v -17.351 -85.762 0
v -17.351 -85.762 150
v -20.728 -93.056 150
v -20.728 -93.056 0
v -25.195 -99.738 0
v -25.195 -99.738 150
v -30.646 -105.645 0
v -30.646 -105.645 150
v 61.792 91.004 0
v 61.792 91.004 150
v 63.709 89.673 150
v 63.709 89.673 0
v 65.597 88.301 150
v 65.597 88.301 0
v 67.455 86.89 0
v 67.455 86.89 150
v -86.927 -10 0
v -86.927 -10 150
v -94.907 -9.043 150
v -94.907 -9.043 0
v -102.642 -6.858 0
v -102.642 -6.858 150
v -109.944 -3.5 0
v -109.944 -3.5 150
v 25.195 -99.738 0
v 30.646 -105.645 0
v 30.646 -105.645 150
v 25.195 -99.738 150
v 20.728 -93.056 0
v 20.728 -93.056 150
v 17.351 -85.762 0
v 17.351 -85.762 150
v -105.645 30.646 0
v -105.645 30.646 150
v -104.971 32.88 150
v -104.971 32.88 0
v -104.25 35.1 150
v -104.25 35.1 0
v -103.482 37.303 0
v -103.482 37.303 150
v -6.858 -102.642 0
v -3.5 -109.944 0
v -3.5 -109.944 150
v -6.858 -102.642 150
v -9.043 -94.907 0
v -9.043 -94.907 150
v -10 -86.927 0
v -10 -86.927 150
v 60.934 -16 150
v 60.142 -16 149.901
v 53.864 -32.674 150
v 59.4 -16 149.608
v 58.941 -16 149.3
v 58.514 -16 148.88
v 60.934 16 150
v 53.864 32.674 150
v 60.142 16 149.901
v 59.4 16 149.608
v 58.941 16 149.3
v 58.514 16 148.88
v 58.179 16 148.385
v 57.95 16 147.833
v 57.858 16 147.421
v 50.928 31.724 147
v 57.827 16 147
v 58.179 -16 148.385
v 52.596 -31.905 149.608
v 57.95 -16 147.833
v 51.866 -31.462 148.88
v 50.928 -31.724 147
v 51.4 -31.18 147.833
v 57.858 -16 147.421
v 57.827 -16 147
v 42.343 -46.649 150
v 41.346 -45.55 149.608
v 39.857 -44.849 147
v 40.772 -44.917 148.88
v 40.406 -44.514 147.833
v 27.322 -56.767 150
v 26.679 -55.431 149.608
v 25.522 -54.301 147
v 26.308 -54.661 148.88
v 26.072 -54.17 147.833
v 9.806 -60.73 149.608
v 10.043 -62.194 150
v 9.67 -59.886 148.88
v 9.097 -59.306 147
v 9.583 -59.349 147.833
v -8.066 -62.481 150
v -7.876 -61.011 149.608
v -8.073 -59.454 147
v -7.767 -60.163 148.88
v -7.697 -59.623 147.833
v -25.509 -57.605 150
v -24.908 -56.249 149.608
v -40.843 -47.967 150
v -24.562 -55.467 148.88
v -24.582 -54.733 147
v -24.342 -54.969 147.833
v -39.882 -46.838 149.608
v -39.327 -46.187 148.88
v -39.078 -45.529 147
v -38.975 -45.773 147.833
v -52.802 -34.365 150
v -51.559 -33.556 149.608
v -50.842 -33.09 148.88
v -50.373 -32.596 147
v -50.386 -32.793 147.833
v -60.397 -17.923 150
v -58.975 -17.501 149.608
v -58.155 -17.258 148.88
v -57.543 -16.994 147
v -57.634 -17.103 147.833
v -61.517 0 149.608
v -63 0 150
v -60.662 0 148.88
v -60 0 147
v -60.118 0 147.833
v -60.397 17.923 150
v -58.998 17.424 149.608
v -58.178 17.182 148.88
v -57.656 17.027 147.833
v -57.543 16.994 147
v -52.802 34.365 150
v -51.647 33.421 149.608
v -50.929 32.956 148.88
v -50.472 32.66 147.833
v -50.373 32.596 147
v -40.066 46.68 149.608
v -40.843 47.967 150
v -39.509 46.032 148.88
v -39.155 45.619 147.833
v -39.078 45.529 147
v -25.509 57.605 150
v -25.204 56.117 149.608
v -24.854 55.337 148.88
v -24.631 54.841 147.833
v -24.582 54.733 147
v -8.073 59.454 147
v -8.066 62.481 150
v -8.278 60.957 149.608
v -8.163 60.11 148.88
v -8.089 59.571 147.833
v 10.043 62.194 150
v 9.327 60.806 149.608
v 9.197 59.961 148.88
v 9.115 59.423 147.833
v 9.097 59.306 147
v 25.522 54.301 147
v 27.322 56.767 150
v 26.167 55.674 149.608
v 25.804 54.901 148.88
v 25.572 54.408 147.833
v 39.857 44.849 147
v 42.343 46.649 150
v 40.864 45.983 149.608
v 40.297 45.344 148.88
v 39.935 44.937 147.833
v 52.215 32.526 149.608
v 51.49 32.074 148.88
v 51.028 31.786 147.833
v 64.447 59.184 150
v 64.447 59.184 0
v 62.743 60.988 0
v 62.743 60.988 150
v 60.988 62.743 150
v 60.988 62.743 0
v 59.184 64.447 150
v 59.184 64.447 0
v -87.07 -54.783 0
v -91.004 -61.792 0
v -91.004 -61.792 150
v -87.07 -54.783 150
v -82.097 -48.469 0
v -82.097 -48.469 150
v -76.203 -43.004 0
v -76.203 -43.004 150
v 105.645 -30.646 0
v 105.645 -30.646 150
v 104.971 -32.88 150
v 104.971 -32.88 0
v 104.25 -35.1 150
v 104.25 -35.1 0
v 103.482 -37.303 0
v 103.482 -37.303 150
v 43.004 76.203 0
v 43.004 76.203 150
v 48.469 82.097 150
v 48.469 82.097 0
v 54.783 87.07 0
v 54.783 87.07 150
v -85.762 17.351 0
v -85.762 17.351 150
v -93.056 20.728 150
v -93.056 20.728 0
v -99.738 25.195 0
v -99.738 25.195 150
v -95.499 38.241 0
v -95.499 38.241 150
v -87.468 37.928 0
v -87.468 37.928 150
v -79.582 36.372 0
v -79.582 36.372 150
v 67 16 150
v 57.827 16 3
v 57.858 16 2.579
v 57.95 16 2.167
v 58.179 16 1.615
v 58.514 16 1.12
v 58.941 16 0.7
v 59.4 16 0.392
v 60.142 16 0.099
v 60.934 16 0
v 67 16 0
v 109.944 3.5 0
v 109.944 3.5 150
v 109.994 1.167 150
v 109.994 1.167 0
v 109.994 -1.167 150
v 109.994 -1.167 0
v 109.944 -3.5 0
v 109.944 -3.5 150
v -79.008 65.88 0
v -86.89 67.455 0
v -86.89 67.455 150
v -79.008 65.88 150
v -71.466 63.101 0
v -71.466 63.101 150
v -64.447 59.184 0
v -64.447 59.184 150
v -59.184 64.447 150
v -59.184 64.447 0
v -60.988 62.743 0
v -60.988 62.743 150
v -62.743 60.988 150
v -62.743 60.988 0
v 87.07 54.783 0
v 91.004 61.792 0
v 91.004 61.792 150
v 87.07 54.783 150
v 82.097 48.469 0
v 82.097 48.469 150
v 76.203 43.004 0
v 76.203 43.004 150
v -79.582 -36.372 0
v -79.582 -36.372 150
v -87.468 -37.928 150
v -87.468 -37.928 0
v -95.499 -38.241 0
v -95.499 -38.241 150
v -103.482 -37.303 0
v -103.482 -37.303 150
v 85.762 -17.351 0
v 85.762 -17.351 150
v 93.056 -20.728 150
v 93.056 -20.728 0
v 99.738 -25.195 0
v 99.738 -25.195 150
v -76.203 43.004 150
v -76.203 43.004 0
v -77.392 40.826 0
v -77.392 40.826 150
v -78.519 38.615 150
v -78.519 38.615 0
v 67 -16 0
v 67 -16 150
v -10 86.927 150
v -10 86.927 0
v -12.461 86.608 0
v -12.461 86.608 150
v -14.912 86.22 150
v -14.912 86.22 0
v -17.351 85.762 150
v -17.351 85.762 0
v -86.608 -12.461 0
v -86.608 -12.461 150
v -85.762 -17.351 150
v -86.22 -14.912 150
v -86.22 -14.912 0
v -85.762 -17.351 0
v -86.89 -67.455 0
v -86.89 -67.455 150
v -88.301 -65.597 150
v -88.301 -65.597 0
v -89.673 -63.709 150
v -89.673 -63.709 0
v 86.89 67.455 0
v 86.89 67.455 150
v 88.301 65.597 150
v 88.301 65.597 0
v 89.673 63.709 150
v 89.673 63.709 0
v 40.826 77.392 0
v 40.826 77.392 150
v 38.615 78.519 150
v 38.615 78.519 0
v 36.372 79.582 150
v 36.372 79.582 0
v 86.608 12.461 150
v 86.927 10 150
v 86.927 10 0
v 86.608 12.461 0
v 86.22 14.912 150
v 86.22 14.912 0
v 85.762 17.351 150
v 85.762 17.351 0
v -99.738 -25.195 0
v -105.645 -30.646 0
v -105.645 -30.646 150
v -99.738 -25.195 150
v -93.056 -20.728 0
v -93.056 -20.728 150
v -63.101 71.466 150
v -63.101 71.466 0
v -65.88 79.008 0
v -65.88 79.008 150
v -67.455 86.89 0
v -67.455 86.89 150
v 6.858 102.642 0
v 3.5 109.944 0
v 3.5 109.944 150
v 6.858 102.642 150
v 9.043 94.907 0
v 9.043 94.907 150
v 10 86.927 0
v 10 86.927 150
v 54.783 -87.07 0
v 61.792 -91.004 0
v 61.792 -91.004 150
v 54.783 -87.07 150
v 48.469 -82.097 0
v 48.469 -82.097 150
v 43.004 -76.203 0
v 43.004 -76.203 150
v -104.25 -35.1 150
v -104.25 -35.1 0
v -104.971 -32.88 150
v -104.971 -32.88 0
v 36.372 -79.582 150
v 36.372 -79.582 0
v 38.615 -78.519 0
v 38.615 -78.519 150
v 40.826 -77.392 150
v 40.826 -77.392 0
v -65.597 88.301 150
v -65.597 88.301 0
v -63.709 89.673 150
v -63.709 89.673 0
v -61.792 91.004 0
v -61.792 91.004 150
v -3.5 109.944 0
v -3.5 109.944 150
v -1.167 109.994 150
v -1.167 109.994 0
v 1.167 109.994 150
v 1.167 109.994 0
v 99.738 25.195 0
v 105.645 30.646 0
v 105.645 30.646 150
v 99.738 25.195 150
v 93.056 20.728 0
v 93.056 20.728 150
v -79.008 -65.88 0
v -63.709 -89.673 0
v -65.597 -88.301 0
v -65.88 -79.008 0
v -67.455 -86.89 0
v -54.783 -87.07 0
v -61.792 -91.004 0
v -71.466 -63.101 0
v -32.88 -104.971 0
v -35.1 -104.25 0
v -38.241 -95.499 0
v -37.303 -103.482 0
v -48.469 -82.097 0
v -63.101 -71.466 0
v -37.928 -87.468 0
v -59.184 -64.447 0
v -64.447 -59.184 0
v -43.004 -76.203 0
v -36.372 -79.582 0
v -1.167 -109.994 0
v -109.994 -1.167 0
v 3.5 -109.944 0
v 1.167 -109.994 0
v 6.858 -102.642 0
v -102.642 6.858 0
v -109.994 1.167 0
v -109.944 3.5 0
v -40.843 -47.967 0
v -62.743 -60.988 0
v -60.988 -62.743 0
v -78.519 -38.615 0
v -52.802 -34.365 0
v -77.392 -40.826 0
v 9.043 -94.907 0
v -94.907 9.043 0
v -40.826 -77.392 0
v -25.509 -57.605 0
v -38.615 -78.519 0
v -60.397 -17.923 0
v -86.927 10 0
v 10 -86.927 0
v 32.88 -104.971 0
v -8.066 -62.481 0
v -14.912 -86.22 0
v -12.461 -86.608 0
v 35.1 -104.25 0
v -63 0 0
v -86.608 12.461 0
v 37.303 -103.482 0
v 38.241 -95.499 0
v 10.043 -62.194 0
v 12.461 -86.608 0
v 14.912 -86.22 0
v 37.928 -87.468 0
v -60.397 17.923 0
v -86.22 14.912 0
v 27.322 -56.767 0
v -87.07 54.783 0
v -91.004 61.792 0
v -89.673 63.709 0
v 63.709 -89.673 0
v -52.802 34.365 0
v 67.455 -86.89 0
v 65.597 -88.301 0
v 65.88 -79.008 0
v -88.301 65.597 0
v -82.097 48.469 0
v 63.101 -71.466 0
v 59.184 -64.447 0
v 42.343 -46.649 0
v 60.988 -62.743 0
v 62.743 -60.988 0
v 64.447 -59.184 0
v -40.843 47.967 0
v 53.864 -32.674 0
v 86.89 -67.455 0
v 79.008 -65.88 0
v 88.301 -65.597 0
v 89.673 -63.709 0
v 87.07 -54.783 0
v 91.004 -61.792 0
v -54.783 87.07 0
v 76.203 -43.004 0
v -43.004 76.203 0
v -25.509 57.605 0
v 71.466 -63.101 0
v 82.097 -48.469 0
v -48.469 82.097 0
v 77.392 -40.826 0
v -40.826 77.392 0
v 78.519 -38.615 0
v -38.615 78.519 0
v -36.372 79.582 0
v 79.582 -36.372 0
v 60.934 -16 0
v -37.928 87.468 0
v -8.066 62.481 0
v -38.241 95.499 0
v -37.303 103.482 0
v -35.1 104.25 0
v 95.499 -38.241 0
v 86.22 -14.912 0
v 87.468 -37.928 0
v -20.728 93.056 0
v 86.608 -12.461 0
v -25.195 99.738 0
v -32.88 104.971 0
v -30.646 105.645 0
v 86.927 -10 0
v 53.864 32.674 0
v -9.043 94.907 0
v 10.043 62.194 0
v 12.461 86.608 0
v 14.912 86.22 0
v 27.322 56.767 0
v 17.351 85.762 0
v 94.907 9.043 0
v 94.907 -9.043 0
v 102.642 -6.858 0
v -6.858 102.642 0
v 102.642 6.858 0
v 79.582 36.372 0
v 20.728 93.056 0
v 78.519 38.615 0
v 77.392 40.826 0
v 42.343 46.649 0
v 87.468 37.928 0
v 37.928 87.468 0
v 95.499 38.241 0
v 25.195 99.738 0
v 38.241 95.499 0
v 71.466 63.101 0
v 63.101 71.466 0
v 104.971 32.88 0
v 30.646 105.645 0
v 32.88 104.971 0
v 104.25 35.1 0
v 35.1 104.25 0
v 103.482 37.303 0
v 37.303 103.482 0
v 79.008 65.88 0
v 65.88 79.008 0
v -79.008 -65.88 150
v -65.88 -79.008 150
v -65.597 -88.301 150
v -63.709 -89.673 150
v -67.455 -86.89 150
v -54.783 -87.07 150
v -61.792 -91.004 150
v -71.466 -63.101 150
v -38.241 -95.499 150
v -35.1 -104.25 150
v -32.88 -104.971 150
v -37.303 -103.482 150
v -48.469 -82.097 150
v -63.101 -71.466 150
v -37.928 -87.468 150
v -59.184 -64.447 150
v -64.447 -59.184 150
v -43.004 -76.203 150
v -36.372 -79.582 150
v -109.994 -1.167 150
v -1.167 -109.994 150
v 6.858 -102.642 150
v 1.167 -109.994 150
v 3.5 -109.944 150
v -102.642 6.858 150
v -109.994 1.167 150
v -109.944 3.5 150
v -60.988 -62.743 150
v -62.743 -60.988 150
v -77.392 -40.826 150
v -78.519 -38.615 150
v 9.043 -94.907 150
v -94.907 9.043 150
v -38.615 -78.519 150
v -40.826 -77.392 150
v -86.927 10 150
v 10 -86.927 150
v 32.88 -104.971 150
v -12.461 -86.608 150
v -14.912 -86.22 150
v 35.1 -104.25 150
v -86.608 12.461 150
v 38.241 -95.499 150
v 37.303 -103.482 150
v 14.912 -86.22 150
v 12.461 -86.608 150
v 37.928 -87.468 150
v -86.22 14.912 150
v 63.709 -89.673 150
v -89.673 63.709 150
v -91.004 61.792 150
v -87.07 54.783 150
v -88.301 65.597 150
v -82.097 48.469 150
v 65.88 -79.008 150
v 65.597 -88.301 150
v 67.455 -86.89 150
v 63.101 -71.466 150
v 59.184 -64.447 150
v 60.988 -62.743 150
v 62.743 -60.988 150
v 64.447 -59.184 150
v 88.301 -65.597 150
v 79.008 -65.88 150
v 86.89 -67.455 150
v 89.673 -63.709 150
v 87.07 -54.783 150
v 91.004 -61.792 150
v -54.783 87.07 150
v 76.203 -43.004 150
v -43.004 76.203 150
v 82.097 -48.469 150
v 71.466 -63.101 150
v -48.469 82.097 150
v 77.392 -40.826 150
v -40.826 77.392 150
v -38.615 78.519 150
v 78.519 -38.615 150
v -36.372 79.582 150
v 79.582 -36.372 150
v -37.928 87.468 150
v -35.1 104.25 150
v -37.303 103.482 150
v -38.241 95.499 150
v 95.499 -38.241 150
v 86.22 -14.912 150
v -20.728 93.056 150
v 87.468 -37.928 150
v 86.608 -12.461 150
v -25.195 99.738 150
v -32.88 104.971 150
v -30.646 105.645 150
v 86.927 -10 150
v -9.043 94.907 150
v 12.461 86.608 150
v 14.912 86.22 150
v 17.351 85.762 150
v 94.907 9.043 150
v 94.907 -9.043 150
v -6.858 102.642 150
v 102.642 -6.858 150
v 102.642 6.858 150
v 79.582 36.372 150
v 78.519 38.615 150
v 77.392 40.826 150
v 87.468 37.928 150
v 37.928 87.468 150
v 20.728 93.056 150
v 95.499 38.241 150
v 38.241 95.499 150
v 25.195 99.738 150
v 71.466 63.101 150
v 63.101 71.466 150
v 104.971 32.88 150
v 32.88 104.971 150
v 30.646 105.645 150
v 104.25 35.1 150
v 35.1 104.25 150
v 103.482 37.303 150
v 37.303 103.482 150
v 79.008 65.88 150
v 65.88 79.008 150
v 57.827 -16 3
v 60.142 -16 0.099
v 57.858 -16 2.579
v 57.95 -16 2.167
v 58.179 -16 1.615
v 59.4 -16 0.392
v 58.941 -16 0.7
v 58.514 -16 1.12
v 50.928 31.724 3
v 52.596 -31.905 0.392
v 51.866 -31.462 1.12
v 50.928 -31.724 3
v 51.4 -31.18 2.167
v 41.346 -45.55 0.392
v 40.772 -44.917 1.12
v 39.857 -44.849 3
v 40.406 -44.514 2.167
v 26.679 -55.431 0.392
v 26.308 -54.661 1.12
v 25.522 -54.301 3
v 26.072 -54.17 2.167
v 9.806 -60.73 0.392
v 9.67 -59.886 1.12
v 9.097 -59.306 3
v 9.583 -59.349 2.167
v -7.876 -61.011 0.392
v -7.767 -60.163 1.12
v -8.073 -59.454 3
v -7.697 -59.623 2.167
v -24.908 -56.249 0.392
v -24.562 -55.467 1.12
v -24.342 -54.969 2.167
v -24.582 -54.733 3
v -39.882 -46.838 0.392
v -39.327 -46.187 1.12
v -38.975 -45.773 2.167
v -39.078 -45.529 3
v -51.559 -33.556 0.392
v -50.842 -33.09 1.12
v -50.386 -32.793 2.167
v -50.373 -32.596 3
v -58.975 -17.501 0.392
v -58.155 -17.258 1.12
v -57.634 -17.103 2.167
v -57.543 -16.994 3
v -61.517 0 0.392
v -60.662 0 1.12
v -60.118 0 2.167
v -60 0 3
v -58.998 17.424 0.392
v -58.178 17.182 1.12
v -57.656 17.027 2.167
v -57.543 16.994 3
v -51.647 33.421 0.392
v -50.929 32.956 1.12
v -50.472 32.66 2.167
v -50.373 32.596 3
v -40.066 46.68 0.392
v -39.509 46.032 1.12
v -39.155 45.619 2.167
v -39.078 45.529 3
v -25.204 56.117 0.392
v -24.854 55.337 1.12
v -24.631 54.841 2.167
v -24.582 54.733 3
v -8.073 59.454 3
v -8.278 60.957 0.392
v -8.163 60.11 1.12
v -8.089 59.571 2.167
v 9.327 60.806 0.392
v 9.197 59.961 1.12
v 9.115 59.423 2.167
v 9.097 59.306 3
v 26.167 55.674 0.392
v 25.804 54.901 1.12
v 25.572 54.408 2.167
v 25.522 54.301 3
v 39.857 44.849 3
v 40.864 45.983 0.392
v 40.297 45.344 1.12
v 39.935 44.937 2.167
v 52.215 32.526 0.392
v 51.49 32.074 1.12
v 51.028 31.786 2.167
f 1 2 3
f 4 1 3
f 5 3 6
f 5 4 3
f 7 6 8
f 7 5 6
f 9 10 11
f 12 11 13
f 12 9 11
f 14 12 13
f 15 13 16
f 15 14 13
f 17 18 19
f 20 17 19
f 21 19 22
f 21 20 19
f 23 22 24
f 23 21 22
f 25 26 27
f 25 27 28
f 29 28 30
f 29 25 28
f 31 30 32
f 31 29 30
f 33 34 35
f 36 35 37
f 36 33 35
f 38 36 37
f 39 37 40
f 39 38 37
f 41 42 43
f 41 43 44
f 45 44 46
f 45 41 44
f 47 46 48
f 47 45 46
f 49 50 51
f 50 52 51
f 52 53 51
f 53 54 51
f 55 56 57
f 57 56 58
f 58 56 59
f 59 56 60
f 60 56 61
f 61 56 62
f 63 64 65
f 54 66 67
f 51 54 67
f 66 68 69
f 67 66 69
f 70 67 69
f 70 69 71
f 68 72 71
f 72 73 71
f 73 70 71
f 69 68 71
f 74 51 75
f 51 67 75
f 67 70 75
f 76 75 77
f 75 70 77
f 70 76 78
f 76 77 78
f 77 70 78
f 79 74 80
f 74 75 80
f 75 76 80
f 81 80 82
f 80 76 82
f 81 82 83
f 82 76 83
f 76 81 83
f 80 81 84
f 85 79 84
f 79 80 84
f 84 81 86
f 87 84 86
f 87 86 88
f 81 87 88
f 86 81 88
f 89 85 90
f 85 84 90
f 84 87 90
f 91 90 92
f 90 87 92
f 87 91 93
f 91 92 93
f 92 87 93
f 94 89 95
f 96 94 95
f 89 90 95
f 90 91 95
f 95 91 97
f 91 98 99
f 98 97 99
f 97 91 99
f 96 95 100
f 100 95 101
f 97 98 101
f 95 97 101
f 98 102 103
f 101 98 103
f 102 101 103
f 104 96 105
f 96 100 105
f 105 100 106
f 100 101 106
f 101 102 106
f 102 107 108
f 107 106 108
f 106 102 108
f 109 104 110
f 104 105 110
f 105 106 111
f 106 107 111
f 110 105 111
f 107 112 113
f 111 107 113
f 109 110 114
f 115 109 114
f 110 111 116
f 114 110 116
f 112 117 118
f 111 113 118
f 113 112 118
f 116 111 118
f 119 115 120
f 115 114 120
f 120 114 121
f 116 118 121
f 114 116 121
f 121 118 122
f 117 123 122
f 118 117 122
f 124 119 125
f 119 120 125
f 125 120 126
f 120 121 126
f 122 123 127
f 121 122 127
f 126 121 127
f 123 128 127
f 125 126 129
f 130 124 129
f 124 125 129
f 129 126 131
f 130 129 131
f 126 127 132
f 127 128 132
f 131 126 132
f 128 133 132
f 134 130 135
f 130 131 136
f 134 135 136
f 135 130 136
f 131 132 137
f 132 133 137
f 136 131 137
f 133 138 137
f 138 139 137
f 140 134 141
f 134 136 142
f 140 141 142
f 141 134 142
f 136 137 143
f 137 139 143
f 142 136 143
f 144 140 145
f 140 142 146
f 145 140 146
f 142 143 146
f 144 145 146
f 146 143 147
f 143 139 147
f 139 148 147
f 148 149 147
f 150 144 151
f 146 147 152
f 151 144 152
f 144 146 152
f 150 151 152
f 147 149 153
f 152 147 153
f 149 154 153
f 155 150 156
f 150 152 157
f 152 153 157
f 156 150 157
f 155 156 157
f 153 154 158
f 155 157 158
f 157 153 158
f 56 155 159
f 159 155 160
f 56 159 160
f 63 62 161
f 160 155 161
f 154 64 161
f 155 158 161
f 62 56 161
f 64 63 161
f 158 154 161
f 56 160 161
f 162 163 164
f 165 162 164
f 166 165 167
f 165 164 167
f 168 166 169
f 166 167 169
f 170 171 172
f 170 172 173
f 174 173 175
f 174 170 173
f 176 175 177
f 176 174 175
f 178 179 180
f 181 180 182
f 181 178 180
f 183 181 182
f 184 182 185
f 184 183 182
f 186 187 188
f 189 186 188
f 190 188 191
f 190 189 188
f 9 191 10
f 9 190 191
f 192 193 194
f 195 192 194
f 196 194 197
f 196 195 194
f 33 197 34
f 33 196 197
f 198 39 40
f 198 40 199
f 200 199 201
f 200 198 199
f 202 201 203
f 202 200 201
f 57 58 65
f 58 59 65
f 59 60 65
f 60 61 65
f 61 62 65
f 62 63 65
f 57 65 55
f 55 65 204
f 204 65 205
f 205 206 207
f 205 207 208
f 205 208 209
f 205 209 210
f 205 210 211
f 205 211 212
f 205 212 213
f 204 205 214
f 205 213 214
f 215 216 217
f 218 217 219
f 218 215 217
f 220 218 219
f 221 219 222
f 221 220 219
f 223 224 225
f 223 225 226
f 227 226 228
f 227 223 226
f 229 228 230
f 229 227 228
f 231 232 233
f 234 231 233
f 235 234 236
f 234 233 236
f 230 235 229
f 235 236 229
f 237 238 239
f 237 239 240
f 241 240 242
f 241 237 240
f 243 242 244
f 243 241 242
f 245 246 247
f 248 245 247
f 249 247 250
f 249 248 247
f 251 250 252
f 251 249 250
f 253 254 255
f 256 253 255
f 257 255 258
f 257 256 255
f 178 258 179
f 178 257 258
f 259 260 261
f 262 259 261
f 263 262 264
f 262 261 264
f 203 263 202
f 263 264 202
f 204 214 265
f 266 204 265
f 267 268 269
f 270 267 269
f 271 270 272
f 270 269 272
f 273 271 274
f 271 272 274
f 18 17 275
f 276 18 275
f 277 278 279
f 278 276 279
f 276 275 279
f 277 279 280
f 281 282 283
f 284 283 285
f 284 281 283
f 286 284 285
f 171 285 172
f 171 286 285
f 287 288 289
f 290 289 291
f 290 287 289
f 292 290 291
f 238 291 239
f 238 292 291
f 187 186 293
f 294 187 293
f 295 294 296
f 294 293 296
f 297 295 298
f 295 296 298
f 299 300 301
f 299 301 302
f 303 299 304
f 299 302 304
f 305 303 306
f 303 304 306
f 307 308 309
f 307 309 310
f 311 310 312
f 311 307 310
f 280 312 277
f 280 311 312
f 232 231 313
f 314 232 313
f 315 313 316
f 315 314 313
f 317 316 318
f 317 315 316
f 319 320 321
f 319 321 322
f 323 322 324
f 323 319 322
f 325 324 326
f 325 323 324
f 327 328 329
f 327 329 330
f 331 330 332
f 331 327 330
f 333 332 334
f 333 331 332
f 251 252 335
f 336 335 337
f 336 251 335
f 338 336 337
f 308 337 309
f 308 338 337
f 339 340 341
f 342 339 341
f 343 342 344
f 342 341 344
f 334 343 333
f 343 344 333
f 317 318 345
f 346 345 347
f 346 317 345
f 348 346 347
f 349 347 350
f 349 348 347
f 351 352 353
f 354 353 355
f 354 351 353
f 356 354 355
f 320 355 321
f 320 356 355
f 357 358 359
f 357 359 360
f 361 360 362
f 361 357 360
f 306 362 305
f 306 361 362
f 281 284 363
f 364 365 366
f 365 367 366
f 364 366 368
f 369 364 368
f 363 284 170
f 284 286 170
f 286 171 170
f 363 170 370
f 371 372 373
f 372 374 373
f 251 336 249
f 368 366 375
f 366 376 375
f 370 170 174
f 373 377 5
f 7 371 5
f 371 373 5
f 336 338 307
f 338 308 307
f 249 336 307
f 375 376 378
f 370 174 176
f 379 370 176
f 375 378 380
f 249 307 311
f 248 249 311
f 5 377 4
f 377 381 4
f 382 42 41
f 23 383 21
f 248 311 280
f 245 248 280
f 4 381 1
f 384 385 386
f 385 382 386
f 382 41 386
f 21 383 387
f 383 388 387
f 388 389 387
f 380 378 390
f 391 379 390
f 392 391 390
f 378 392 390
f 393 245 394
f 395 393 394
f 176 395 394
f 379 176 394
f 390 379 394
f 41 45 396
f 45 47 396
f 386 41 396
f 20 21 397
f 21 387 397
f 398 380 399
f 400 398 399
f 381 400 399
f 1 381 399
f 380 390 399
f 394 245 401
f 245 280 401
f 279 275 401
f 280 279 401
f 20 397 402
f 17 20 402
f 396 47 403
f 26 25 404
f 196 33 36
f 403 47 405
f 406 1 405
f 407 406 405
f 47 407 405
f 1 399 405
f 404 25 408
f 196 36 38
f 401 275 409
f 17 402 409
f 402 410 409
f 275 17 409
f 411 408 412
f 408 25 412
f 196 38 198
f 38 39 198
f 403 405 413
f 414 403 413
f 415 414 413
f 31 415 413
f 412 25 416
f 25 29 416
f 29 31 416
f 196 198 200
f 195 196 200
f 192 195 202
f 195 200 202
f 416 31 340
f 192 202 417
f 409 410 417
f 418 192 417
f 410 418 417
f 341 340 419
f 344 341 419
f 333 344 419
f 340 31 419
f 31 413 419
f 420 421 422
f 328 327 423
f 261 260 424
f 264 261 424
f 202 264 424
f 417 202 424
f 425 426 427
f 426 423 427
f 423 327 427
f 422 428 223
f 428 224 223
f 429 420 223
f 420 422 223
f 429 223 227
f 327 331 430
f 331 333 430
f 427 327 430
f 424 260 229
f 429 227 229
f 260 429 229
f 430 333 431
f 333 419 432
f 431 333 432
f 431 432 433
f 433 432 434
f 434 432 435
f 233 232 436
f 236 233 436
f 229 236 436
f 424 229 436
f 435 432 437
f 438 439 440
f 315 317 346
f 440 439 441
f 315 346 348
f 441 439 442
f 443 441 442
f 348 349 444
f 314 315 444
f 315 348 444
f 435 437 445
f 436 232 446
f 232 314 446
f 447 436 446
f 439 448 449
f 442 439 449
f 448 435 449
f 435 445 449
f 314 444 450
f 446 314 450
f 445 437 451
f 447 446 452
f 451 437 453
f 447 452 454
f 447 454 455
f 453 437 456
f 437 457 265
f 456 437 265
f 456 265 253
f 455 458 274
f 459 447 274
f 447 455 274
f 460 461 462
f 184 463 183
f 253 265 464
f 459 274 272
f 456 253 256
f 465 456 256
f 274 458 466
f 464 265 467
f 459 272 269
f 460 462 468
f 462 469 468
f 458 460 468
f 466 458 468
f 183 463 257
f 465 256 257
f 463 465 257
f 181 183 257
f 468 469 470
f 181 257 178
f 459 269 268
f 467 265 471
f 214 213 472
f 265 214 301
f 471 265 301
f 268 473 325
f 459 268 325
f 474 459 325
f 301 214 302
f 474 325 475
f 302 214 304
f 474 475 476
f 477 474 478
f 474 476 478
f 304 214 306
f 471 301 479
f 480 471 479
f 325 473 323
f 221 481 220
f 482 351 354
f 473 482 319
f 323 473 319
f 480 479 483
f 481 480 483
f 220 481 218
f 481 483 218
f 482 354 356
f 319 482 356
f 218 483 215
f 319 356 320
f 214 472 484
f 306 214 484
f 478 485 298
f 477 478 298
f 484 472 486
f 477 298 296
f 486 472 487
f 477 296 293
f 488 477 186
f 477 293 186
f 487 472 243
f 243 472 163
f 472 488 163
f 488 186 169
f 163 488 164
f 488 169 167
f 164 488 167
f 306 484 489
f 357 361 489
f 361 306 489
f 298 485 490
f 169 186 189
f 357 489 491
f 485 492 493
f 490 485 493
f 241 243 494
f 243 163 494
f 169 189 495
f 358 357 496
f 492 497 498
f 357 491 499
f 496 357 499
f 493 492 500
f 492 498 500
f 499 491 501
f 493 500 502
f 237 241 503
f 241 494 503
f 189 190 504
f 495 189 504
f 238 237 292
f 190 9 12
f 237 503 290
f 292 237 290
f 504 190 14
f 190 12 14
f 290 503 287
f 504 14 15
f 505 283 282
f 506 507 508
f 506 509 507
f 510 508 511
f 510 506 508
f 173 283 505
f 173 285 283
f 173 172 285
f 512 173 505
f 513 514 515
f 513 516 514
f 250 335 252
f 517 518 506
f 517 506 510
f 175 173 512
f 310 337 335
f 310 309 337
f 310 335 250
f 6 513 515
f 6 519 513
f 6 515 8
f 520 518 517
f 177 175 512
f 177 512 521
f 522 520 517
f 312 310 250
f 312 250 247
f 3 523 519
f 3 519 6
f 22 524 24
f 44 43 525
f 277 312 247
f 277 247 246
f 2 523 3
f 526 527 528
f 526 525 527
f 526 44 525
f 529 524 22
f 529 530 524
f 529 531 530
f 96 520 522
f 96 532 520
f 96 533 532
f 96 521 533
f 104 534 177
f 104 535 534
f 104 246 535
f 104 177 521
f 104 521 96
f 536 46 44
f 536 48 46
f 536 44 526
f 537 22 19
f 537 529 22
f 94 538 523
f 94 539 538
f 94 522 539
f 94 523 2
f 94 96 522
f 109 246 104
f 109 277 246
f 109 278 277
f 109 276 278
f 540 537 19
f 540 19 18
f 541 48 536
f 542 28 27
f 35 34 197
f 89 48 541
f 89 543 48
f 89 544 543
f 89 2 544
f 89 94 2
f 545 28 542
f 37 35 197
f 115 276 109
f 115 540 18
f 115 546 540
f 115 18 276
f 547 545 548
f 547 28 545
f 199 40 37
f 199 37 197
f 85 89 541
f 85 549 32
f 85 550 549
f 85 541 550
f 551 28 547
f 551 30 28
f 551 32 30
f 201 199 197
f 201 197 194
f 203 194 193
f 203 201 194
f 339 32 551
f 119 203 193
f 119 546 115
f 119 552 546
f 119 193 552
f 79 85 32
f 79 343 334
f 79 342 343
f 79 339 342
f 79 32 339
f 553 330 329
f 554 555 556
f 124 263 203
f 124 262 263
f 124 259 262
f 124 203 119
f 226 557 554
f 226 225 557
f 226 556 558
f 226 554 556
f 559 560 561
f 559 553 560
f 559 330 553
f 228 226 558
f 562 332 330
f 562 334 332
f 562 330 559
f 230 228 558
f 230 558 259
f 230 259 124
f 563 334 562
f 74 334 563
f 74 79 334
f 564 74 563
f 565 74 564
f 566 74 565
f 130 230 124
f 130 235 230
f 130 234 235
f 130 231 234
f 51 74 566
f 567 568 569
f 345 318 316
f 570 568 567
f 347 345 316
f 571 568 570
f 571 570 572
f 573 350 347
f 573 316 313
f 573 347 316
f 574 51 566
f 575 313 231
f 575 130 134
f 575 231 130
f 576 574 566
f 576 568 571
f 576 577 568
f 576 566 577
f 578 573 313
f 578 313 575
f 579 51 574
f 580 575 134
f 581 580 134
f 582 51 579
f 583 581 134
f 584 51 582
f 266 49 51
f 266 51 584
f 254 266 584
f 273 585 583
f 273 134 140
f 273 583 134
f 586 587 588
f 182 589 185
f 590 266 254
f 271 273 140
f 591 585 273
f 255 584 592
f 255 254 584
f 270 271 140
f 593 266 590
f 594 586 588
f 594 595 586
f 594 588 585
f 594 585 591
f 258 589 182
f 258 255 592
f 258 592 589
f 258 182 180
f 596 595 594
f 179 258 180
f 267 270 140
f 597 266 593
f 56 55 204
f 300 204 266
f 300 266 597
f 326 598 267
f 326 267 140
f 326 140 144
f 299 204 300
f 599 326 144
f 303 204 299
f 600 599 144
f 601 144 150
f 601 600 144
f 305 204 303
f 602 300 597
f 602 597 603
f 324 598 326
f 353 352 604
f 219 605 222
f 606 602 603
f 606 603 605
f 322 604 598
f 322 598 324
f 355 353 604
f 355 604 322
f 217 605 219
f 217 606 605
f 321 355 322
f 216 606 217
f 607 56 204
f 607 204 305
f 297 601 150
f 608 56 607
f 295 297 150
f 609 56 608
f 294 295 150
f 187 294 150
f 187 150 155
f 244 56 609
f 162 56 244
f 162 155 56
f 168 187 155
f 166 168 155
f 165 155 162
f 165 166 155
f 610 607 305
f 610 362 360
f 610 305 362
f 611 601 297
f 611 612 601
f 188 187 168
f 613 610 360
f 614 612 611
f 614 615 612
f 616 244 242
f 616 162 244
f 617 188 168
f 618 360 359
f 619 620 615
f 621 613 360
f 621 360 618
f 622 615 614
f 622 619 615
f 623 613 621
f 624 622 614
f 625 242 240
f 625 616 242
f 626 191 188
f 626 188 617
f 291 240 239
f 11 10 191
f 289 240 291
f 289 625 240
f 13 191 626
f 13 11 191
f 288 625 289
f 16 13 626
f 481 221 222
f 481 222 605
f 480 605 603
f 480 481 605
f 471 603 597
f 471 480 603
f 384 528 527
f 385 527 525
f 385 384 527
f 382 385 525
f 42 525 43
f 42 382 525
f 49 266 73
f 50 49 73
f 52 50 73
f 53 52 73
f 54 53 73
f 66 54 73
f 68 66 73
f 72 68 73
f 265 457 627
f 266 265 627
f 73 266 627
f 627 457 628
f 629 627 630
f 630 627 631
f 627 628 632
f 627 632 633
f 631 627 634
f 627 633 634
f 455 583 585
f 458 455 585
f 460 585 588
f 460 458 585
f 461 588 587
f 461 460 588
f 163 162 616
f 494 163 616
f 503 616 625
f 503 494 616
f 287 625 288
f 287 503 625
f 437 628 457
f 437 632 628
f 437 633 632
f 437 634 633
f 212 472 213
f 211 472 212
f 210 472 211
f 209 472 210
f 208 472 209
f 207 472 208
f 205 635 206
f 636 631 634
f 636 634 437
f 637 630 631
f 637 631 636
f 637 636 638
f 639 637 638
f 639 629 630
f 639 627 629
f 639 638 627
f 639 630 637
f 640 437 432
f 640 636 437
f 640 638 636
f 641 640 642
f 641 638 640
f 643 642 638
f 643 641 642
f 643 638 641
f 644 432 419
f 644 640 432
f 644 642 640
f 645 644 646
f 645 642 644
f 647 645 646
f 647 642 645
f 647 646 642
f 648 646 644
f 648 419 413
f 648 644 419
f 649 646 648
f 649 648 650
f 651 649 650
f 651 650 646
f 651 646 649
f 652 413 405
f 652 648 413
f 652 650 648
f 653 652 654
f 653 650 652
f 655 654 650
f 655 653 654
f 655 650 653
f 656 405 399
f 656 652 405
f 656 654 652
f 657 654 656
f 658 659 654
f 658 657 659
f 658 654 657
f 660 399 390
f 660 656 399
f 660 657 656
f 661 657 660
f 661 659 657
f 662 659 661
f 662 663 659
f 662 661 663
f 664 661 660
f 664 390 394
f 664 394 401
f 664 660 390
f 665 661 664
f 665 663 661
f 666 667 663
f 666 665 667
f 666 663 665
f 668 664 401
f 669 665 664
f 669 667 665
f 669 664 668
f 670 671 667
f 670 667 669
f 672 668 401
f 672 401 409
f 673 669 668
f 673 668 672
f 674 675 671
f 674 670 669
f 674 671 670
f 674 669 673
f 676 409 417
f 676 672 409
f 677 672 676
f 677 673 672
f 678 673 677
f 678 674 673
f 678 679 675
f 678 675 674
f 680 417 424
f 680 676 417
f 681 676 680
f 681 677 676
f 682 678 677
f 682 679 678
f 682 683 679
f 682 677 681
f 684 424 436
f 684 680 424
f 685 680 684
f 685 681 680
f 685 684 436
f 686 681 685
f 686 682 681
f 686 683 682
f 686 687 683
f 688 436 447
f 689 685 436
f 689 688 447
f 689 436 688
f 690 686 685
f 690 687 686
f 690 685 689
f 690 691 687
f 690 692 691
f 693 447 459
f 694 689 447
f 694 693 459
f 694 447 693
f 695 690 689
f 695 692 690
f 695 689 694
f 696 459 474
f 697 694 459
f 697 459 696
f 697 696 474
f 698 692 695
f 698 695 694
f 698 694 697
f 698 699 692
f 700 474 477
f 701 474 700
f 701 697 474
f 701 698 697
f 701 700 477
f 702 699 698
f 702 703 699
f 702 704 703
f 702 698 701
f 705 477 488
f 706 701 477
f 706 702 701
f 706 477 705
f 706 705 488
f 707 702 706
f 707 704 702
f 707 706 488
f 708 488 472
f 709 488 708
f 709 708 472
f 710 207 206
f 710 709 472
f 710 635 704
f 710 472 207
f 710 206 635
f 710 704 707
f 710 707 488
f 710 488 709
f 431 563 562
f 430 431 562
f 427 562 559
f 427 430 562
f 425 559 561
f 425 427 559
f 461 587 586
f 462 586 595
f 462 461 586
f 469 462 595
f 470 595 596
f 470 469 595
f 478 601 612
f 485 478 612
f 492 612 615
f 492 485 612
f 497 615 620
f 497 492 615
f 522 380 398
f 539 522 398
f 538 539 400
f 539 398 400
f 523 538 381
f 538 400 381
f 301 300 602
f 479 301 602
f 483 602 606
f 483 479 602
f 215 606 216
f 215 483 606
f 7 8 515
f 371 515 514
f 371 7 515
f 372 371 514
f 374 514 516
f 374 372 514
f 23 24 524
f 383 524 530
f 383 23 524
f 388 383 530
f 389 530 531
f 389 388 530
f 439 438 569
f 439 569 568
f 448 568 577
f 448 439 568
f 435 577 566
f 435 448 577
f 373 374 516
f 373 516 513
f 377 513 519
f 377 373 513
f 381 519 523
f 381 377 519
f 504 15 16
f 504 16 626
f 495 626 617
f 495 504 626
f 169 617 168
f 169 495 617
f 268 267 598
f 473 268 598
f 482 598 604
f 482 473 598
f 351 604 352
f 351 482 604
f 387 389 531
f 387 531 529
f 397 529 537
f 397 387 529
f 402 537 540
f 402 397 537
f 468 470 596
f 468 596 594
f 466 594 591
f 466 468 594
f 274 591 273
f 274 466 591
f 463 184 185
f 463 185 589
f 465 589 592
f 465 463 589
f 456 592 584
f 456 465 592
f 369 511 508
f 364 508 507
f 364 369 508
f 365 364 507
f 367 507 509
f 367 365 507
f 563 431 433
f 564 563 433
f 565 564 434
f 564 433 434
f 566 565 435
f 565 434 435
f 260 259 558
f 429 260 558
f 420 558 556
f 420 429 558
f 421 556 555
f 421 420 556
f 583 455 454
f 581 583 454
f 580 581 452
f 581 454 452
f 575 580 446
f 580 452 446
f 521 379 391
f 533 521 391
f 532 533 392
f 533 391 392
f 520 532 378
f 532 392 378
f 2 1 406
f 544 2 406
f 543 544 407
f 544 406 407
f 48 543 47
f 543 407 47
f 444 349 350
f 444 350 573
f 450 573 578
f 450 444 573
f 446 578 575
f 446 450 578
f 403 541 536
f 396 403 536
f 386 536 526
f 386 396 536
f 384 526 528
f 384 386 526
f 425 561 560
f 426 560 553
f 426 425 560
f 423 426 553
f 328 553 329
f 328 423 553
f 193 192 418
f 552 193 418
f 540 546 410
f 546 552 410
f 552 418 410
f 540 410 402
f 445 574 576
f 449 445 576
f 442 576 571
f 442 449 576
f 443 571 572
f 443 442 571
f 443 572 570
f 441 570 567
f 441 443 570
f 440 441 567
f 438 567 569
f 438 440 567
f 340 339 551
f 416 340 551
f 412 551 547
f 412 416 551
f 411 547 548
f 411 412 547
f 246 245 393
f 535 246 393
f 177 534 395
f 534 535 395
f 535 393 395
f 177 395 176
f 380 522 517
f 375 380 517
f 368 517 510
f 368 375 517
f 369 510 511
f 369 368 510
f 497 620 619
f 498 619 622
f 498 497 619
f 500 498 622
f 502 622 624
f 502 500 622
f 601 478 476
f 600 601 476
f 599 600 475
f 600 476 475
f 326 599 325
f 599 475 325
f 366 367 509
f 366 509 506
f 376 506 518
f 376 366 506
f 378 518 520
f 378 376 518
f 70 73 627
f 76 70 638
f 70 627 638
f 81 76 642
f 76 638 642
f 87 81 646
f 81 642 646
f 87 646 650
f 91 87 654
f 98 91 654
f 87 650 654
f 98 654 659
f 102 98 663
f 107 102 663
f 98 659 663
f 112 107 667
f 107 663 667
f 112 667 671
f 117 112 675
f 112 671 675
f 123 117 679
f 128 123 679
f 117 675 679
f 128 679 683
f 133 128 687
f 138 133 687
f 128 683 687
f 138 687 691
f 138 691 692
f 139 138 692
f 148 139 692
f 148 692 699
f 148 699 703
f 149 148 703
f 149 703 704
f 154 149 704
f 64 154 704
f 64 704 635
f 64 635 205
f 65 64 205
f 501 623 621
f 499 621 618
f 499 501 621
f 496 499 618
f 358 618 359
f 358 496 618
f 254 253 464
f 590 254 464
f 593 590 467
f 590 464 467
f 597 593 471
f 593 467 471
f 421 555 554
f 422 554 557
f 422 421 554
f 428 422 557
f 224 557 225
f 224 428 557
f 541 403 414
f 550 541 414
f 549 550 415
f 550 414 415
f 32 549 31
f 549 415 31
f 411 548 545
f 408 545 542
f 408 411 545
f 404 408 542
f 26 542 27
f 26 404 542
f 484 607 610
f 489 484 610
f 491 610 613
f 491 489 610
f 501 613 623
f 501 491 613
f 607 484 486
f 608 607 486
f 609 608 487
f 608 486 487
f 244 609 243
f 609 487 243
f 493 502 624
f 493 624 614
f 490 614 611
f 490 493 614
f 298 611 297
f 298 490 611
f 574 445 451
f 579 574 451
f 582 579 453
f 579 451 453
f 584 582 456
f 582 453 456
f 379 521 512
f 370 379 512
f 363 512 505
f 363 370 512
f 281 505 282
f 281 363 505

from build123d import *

# Parameters (mm, degrees)
SKETCH_1_R               = 87.5
EXTRUDE_1_DEPTH          = 150
EXTRUDE_2_DEPTH          = 150
PATTERN_CIRCULAR_1_COUNT = 20
CUT_EXTRUDE_1_DEPTH      = 217.10182785
FILLET_1_R               = 3


with BuildPart() as part:
    # 草图1 → 拉伸1 (new body)
    with BuildSketch(Plane.XY):
        Circle(SKETCH_1_R)
    extrude(amount=EXTRUDE_1_DEPTH)

    # 草图2 → 拉伸2 (add)
    with BuildSketch(Plane.XY):
        with BuildLine():
            ThreePointArc((10, 86.926693254), (0, 87.5), (-10, 86.926693254))
            ThreePointArc((-10, 86.926693254), (-8.101258535, 98.817083904), (-3.5, 109.944304082))
            ThreePointArc((-3.5, 109.944304082), (0, 110), (3.5, 109.944304082))
            ThreePointArc((3.5, 109.944304082), (8.101258535, 98.817083904), (10, 86.926693254))
        make_face()
    extrude_2 = extrude(amount=EXTRUDE_2_DEPTH)

    # 阵列(圆周)1: 拉伸2 ×20 about axis
    pattern_circular_1_axis = Axis((0, 0, 0), (0, 0, 1))
    for i in range(1, PATTERN_CIRCULAR_1_COUNT):
        add(extrude_2.rotate(pattern_circular_1_axis, i * 360 / PATTERN_CIRCULAR_1_COUNT))

    # 草图3 → 切除-拉伸1 (cut, through all)
    with BuildSketch(Plane.XY):
        with BuildLine():
            Line((57.827329179, 16), (67, 16))
            Line((67, 16), (67, -16))
            Line((67, -16), (57.827329179, -16))
            ThreePointArc((57.827329179, -16), (-60, 0), (57.827329179, 16))
        make_face()
    extrude(amount=CUT_EXTRUDE_1_DEPTH, mode=Mode.SUBTRACT)

    # 圆角1
    fillet_1_edges = [part.edges().sort_by_distance(p)[0] for p in [
        (-60, 0, 0),
        (-60, 0, 150),
    ]]
    fillet(fillet_1_edges, radius=FILLET_1_R)


solid = part.part
